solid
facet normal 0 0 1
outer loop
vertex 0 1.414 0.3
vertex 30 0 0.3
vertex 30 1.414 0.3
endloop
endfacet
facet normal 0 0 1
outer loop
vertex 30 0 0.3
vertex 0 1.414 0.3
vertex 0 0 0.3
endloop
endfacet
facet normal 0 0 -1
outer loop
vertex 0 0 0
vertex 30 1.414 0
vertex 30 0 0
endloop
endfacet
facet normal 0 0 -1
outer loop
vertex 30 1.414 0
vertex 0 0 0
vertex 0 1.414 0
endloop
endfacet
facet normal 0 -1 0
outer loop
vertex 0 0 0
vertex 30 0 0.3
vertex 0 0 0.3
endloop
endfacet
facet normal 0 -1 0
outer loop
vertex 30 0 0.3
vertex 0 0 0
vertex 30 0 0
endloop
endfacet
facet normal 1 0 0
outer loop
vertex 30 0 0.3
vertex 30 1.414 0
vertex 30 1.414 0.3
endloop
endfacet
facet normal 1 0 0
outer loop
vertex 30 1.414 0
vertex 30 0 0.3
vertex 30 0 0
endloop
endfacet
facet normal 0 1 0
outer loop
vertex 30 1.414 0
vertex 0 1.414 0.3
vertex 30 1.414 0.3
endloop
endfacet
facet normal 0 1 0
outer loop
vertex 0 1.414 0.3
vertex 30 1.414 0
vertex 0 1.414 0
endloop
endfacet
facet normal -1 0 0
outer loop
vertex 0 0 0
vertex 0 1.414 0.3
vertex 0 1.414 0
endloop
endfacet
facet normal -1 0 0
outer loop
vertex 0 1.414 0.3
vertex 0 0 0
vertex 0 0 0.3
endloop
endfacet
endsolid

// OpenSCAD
// file: global.scad
$fn = 20;

epsilon = 0.005;
epsilon2 = epsilon * 2;

width = 30;
height = 4.5;
depth = 20;
thickness = 0.3;

explode_dist = 0;
// main file
include <global.scad>;

module part5()
{
    color("SaddleBrown") difference()
    {
        cube(size = [width, 1 / cos(45), thickness]);
    }
}

module part5_2d()
{
    projection() part5();
}

part5();
